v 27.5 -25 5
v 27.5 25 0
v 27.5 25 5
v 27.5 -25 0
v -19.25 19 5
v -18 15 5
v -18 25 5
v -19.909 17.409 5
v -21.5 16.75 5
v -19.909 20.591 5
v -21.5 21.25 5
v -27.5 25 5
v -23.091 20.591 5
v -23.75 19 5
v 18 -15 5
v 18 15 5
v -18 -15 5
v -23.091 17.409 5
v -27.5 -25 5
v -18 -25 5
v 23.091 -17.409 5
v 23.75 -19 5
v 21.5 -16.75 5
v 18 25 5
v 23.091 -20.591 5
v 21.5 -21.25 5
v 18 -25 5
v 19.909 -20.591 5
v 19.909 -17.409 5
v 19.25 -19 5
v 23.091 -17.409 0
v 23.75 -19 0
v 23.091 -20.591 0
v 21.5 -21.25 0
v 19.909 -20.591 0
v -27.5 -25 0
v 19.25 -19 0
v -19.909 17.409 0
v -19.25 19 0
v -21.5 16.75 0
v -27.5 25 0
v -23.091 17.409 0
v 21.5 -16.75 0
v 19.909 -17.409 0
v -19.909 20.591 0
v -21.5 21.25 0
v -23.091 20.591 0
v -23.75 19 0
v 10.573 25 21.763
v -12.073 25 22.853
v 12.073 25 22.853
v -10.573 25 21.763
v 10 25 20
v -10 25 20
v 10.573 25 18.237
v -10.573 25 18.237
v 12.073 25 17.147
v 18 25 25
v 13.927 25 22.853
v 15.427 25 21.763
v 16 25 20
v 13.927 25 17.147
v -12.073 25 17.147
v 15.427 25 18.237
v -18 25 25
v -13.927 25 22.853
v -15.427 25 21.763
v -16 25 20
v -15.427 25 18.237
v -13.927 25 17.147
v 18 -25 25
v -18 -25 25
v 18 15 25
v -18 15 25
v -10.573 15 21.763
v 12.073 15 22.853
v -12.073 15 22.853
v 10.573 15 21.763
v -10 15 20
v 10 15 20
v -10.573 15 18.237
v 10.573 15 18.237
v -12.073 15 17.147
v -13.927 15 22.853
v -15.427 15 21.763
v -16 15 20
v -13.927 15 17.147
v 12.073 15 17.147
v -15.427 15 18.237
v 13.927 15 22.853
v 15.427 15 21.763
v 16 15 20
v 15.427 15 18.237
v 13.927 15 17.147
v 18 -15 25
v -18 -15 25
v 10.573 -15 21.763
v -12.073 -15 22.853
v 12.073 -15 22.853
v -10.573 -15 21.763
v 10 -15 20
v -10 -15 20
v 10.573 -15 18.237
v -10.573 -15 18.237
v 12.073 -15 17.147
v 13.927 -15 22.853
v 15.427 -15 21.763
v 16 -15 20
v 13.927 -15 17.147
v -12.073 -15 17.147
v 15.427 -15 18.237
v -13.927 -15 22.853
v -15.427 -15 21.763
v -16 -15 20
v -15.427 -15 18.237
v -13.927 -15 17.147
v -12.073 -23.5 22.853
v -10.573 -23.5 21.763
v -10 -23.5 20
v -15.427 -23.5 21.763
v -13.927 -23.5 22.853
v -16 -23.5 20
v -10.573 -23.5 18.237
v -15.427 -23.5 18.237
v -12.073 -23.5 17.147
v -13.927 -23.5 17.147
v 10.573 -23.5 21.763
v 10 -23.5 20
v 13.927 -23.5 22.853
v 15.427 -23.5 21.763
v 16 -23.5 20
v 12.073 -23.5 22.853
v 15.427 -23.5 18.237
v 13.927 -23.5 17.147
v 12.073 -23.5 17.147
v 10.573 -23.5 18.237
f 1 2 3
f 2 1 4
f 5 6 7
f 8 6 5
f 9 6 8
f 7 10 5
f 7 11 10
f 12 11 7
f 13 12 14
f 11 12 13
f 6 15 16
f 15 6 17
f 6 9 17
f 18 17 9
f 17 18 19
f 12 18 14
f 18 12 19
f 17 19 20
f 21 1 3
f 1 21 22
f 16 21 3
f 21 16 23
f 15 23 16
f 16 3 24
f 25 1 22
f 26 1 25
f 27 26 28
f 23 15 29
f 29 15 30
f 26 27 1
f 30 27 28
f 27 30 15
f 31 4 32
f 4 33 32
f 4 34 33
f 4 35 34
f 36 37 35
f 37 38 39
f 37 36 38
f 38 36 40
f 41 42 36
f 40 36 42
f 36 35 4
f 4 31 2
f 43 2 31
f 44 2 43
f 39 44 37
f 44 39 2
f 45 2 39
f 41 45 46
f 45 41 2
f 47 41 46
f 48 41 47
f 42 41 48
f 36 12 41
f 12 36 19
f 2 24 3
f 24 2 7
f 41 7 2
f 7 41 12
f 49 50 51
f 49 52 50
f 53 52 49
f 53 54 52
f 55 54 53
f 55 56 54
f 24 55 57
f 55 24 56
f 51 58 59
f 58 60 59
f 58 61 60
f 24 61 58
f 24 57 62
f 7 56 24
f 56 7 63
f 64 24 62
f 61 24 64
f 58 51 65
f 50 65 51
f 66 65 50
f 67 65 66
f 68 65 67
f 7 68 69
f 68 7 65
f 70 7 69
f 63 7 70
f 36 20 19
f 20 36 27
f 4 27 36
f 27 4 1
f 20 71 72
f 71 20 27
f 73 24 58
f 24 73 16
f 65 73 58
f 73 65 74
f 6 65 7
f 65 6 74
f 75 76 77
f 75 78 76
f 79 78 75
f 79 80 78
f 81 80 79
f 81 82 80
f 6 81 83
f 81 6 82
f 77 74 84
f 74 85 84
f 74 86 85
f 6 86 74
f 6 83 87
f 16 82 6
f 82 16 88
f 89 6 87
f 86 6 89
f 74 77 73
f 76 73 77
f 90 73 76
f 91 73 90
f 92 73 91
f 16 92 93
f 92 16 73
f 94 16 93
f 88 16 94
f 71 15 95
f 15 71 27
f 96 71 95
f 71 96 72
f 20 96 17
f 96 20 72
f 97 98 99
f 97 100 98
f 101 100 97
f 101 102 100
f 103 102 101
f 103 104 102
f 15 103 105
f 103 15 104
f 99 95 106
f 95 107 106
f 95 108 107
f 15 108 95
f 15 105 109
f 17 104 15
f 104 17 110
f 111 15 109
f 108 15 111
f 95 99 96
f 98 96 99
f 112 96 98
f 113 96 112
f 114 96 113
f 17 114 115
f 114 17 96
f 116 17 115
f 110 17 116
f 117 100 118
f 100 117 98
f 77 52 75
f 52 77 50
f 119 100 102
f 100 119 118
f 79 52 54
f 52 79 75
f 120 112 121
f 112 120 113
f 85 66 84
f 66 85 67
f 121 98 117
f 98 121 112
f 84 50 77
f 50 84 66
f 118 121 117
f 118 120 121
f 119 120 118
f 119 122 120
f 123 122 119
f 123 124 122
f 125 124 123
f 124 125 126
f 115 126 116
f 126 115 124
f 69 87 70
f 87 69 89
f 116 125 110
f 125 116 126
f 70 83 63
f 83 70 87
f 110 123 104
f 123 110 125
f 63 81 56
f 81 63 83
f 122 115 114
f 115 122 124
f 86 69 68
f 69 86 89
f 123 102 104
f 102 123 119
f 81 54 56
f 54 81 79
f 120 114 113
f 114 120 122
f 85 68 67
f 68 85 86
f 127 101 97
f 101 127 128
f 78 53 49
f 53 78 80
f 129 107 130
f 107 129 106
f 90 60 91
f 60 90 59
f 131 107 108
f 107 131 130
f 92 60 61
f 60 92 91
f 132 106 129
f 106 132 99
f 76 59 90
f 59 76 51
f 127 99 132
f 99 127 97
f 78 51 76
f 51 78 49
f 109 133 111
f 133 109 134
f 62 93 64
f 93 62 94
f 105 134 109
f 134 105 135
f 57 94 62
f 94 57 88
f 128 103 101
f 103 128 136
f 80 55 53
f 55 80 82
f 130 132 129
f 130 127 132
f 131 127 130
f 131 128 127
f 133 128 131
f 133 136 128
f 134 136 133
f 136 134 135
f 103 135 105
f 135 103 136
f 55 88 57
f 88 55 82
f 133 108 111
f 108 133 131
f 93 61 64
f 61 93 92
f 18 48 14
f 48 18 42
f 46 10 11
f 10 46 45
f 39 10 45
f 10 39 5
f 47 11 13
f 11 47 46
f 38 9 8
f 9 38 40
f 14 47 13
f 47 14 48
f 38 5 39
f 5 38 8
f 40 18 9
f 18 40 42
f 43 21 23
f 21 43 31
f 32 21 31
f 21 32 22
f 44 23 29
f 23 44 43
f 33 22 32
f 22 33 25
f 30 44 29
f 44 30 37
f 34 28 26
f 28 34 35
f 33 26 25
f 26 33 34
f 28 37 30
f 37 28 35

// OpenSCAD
difference(){
    union(){
        translate([0,0,2.5])
            cube([55,50,5],true);
        translate([0,20,12.5])
            cube([36,10,25],true);
        translate([0,-20,12.5])
            cube([36,10,25],true);
    }
    translate([-43/2,38/2,-1])
        cylinder(h=15,r=4.5/2);
    translate([43/2,-38/2,-1])
        cylinder(h=15,r=4.5/2);
    translate([0,0,20])
    union()
    {
    translate([-13,2,0])
        rotate([90,0,0])
        cylinder(51,d=6,center=true);
    translate([13,2,0])
        rotate([90,0,0])
        cylinder(51,d=6,center=true);
    }
}
